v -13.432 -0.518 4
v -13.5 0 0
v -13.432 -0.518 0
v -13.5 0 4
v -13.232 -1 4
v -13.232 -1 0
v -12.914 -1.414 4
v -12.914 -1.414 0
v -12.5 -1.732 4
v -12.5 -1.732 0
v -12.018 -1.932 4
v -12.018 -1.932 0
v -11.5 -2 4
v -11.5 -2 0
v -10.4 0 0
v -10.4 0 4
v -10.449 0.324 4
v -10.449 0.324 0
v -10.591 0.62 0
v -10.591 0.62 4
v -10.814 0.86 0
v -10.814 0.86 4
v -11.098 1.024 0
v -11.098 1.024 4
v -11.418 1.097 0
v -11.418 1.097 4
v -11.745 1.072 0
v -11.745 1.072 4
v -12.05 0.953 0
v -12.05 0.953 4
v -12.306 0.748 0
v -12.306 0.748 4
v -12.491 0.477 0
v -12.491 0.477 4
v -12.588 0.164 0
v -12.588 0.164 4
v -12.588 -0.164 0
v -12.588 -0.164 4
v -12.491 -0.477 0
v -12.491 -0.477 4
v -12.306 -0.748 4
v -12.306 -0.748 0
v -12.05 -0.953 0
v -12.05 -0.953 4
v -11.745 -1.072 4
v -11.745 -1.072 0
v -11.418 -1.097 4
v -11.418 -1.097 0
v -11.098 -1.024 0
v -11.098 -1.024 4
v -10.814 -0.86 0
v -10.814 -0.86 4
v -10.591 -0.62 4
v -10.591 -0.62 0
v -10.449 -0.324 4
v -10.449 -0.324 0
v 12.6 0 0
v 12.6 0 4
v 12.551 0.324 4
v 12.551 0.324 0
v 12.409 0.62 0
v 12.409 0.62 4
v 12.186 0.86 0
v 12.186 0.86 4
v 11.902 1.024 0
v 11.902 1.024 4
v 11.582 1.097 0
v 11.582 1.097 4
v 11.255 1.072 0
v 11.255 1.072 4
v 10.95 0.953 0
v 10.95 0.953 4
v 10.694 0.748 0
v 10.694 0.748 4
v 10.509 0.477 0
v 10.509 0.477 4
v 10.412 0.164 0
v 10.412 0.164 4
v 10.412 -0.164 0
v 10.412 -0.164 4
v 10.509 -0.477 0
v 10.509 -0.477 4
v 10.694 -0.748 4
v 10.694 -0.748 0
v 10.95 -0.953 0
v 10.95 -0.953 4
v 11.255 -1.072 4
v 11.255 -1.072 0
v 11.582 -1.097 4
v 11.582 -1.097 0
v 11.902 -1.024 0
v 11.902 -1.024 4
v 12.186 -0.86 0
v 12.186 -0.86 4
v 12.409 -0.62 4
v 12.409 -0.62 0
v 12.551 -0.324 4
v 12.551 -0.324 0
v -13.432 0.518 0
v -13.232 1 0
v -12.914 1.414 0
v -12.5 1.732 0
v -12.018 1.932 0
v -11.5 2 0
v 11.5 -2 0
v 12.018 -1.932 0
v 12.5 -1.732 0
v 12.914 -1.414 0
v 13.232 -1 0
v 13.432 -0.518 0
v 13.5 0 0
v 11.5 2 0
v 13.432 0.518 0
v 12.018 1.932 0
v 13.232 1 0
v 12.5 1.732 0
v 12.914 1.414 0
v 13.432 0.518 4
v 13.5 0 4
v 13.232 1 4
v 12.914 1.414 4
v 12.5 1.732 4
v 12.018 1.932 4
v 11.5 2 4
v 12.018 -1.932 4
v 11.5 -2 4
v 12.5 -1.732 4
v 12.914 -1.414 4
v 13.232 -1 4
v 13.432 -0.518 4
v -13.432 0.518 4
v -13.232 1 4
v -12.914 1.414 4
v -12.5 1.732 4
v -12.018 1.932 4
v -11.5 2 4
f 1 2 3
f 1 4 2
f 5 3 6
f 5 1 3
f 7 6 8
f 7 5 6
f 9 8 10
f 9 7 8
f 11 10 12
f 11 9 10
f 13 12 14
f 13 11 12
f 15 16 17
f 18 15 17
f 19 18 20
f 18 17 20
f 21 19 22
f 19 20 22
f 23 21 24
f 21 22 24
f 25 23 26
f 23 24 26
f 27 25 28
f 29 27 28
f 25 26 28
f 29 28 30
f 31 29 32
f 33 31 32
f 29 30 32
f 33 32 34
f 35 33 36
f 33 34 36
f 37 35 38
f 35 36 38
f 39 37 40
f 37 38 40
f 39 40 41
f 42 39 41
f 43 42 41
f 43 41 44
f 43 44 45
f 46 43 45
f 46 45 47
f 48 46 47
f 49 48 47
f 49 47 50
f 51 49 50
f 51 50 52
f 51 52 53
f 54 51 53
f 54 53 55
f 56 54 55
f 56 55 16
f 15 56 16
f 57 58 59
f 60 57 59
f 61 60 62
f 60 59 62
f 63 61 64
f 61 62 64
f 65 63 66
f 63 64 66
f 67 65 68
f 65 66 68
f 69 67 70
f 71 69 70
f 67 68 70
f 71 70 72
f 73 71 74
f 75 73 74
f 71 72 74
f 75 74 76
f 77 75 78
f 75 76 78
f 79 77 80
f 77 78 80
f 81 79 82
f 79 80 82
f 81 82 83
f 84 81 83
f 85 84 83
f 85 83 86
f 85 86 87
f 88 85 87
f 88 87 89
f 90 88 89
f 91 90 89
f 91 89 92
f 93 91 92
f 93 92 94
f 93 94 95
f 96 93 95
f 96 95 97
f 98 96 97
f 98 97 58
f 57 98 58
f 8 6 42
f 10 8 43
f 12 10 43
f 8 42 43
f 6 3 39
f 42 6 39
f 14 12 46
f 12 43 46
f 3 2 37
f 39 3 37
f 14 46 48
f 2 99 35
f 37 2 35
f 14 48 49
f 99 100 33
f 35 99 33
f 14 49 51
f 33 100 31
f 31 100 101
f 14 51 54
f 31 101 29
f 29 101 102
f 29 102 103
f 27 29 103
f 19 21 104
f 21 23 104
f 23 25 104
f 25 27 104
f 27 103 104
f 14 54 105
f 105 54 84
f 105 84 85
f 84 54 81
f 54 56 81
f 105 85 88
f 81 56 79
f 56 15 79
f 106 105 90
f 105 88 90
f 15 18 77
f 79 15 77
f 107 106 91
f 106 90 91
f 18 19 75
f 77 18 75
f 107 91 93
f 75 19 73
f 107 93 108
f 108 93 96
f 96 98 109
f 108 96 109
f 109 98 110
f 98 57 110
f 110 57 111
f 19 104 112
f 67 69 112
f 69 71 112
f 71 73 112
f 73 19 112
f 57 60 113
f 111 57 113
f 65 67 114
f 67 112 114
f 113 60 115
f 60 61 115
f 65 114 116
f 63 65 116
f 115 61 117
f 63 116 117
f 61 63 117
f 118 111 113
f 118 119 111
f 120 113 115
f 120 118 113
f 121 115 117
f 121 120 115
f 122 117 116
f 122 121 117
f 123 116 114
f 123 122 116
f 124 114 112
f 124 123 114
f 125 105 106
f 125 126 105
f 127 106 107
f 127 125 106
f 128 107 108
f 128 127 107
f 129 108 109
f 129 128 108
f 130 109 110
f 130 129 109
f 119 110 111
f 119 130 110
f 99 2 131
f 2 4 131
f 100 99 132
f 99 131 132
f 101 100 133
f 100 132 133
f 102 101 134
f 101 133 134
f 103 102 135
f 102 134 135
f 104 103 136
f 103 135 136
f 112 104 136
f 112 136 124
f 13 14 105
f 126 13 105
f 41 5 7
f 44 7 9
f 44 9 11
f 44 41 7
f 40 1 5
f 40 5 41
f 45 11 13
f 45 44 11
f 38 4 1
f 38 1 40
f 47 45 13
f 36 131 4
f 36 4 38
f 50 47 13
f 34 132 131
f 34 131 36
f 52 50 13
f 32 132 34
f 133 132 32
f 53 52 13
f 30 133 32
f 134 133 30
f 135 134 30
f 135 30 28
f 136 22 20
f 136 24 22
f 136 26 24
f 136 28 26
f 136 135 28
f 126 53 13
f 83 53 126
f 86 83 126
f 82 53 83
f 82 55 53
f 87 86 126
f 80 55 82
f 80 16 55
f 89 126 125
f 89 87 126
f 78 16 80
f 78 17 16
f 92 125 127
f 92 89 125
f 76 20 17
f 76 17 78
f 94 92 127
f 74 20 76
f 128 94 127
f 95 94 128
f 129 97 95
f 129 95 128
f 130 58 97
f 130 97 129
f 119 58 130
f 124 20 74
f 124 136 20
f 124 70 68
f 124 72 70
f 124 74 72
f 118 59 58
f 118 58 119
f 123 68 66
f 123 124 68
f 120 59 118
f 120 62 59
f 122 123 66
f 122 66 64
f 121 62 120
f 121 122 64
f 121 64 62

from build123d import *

# Parameters (mm, degrees)
SKETCH_1_W          = 27
SKETCH_1_H          = 4
EXTRUDE_1_DEPTH     = 4
FILLET_1_R          = 2
SKETCH_2_R          = 1.1
CUT_EXTRUDE_1_DEPTH = 13


with BuildPart() as part:
    # 草图1 → 凸台-拉伸1 (new body)
    with BuildSketch(Plane.XY):
        Rectangle(SKETCH_1_W, SKETCH_1_H)
    extrude(amount=EXTRUDE_1_DEPTH)

    # 圆角1
    fillet_1_edges = [part.edges().sort_by_distance(p)[0] for p in [
        (-13.5, -2, 2),
        (-13.5, 2, 2),
        (13.5, -2, 2),
        (13.5, 2, 2),
    ]]
    fillet(fillet_1_edges, radius=FILLET_1_R - 0.0001)  # a hair under: the kernel refuses the full size

    # 草图2 → 切除-拉伸1 (cut)
    with BuildSketch(Plane.XY.offset(4)):
        with Locations((-11.5, 0)):
            Circle(SKETCH_2_R)
        with Locations((11.5, 0)):
            Circle(SKETCH_2_R)
    extrude(amount=-CUT_EXTRUDE_1_DEPTH, mode=Mode.SUBTRACT)


solid = part.part
